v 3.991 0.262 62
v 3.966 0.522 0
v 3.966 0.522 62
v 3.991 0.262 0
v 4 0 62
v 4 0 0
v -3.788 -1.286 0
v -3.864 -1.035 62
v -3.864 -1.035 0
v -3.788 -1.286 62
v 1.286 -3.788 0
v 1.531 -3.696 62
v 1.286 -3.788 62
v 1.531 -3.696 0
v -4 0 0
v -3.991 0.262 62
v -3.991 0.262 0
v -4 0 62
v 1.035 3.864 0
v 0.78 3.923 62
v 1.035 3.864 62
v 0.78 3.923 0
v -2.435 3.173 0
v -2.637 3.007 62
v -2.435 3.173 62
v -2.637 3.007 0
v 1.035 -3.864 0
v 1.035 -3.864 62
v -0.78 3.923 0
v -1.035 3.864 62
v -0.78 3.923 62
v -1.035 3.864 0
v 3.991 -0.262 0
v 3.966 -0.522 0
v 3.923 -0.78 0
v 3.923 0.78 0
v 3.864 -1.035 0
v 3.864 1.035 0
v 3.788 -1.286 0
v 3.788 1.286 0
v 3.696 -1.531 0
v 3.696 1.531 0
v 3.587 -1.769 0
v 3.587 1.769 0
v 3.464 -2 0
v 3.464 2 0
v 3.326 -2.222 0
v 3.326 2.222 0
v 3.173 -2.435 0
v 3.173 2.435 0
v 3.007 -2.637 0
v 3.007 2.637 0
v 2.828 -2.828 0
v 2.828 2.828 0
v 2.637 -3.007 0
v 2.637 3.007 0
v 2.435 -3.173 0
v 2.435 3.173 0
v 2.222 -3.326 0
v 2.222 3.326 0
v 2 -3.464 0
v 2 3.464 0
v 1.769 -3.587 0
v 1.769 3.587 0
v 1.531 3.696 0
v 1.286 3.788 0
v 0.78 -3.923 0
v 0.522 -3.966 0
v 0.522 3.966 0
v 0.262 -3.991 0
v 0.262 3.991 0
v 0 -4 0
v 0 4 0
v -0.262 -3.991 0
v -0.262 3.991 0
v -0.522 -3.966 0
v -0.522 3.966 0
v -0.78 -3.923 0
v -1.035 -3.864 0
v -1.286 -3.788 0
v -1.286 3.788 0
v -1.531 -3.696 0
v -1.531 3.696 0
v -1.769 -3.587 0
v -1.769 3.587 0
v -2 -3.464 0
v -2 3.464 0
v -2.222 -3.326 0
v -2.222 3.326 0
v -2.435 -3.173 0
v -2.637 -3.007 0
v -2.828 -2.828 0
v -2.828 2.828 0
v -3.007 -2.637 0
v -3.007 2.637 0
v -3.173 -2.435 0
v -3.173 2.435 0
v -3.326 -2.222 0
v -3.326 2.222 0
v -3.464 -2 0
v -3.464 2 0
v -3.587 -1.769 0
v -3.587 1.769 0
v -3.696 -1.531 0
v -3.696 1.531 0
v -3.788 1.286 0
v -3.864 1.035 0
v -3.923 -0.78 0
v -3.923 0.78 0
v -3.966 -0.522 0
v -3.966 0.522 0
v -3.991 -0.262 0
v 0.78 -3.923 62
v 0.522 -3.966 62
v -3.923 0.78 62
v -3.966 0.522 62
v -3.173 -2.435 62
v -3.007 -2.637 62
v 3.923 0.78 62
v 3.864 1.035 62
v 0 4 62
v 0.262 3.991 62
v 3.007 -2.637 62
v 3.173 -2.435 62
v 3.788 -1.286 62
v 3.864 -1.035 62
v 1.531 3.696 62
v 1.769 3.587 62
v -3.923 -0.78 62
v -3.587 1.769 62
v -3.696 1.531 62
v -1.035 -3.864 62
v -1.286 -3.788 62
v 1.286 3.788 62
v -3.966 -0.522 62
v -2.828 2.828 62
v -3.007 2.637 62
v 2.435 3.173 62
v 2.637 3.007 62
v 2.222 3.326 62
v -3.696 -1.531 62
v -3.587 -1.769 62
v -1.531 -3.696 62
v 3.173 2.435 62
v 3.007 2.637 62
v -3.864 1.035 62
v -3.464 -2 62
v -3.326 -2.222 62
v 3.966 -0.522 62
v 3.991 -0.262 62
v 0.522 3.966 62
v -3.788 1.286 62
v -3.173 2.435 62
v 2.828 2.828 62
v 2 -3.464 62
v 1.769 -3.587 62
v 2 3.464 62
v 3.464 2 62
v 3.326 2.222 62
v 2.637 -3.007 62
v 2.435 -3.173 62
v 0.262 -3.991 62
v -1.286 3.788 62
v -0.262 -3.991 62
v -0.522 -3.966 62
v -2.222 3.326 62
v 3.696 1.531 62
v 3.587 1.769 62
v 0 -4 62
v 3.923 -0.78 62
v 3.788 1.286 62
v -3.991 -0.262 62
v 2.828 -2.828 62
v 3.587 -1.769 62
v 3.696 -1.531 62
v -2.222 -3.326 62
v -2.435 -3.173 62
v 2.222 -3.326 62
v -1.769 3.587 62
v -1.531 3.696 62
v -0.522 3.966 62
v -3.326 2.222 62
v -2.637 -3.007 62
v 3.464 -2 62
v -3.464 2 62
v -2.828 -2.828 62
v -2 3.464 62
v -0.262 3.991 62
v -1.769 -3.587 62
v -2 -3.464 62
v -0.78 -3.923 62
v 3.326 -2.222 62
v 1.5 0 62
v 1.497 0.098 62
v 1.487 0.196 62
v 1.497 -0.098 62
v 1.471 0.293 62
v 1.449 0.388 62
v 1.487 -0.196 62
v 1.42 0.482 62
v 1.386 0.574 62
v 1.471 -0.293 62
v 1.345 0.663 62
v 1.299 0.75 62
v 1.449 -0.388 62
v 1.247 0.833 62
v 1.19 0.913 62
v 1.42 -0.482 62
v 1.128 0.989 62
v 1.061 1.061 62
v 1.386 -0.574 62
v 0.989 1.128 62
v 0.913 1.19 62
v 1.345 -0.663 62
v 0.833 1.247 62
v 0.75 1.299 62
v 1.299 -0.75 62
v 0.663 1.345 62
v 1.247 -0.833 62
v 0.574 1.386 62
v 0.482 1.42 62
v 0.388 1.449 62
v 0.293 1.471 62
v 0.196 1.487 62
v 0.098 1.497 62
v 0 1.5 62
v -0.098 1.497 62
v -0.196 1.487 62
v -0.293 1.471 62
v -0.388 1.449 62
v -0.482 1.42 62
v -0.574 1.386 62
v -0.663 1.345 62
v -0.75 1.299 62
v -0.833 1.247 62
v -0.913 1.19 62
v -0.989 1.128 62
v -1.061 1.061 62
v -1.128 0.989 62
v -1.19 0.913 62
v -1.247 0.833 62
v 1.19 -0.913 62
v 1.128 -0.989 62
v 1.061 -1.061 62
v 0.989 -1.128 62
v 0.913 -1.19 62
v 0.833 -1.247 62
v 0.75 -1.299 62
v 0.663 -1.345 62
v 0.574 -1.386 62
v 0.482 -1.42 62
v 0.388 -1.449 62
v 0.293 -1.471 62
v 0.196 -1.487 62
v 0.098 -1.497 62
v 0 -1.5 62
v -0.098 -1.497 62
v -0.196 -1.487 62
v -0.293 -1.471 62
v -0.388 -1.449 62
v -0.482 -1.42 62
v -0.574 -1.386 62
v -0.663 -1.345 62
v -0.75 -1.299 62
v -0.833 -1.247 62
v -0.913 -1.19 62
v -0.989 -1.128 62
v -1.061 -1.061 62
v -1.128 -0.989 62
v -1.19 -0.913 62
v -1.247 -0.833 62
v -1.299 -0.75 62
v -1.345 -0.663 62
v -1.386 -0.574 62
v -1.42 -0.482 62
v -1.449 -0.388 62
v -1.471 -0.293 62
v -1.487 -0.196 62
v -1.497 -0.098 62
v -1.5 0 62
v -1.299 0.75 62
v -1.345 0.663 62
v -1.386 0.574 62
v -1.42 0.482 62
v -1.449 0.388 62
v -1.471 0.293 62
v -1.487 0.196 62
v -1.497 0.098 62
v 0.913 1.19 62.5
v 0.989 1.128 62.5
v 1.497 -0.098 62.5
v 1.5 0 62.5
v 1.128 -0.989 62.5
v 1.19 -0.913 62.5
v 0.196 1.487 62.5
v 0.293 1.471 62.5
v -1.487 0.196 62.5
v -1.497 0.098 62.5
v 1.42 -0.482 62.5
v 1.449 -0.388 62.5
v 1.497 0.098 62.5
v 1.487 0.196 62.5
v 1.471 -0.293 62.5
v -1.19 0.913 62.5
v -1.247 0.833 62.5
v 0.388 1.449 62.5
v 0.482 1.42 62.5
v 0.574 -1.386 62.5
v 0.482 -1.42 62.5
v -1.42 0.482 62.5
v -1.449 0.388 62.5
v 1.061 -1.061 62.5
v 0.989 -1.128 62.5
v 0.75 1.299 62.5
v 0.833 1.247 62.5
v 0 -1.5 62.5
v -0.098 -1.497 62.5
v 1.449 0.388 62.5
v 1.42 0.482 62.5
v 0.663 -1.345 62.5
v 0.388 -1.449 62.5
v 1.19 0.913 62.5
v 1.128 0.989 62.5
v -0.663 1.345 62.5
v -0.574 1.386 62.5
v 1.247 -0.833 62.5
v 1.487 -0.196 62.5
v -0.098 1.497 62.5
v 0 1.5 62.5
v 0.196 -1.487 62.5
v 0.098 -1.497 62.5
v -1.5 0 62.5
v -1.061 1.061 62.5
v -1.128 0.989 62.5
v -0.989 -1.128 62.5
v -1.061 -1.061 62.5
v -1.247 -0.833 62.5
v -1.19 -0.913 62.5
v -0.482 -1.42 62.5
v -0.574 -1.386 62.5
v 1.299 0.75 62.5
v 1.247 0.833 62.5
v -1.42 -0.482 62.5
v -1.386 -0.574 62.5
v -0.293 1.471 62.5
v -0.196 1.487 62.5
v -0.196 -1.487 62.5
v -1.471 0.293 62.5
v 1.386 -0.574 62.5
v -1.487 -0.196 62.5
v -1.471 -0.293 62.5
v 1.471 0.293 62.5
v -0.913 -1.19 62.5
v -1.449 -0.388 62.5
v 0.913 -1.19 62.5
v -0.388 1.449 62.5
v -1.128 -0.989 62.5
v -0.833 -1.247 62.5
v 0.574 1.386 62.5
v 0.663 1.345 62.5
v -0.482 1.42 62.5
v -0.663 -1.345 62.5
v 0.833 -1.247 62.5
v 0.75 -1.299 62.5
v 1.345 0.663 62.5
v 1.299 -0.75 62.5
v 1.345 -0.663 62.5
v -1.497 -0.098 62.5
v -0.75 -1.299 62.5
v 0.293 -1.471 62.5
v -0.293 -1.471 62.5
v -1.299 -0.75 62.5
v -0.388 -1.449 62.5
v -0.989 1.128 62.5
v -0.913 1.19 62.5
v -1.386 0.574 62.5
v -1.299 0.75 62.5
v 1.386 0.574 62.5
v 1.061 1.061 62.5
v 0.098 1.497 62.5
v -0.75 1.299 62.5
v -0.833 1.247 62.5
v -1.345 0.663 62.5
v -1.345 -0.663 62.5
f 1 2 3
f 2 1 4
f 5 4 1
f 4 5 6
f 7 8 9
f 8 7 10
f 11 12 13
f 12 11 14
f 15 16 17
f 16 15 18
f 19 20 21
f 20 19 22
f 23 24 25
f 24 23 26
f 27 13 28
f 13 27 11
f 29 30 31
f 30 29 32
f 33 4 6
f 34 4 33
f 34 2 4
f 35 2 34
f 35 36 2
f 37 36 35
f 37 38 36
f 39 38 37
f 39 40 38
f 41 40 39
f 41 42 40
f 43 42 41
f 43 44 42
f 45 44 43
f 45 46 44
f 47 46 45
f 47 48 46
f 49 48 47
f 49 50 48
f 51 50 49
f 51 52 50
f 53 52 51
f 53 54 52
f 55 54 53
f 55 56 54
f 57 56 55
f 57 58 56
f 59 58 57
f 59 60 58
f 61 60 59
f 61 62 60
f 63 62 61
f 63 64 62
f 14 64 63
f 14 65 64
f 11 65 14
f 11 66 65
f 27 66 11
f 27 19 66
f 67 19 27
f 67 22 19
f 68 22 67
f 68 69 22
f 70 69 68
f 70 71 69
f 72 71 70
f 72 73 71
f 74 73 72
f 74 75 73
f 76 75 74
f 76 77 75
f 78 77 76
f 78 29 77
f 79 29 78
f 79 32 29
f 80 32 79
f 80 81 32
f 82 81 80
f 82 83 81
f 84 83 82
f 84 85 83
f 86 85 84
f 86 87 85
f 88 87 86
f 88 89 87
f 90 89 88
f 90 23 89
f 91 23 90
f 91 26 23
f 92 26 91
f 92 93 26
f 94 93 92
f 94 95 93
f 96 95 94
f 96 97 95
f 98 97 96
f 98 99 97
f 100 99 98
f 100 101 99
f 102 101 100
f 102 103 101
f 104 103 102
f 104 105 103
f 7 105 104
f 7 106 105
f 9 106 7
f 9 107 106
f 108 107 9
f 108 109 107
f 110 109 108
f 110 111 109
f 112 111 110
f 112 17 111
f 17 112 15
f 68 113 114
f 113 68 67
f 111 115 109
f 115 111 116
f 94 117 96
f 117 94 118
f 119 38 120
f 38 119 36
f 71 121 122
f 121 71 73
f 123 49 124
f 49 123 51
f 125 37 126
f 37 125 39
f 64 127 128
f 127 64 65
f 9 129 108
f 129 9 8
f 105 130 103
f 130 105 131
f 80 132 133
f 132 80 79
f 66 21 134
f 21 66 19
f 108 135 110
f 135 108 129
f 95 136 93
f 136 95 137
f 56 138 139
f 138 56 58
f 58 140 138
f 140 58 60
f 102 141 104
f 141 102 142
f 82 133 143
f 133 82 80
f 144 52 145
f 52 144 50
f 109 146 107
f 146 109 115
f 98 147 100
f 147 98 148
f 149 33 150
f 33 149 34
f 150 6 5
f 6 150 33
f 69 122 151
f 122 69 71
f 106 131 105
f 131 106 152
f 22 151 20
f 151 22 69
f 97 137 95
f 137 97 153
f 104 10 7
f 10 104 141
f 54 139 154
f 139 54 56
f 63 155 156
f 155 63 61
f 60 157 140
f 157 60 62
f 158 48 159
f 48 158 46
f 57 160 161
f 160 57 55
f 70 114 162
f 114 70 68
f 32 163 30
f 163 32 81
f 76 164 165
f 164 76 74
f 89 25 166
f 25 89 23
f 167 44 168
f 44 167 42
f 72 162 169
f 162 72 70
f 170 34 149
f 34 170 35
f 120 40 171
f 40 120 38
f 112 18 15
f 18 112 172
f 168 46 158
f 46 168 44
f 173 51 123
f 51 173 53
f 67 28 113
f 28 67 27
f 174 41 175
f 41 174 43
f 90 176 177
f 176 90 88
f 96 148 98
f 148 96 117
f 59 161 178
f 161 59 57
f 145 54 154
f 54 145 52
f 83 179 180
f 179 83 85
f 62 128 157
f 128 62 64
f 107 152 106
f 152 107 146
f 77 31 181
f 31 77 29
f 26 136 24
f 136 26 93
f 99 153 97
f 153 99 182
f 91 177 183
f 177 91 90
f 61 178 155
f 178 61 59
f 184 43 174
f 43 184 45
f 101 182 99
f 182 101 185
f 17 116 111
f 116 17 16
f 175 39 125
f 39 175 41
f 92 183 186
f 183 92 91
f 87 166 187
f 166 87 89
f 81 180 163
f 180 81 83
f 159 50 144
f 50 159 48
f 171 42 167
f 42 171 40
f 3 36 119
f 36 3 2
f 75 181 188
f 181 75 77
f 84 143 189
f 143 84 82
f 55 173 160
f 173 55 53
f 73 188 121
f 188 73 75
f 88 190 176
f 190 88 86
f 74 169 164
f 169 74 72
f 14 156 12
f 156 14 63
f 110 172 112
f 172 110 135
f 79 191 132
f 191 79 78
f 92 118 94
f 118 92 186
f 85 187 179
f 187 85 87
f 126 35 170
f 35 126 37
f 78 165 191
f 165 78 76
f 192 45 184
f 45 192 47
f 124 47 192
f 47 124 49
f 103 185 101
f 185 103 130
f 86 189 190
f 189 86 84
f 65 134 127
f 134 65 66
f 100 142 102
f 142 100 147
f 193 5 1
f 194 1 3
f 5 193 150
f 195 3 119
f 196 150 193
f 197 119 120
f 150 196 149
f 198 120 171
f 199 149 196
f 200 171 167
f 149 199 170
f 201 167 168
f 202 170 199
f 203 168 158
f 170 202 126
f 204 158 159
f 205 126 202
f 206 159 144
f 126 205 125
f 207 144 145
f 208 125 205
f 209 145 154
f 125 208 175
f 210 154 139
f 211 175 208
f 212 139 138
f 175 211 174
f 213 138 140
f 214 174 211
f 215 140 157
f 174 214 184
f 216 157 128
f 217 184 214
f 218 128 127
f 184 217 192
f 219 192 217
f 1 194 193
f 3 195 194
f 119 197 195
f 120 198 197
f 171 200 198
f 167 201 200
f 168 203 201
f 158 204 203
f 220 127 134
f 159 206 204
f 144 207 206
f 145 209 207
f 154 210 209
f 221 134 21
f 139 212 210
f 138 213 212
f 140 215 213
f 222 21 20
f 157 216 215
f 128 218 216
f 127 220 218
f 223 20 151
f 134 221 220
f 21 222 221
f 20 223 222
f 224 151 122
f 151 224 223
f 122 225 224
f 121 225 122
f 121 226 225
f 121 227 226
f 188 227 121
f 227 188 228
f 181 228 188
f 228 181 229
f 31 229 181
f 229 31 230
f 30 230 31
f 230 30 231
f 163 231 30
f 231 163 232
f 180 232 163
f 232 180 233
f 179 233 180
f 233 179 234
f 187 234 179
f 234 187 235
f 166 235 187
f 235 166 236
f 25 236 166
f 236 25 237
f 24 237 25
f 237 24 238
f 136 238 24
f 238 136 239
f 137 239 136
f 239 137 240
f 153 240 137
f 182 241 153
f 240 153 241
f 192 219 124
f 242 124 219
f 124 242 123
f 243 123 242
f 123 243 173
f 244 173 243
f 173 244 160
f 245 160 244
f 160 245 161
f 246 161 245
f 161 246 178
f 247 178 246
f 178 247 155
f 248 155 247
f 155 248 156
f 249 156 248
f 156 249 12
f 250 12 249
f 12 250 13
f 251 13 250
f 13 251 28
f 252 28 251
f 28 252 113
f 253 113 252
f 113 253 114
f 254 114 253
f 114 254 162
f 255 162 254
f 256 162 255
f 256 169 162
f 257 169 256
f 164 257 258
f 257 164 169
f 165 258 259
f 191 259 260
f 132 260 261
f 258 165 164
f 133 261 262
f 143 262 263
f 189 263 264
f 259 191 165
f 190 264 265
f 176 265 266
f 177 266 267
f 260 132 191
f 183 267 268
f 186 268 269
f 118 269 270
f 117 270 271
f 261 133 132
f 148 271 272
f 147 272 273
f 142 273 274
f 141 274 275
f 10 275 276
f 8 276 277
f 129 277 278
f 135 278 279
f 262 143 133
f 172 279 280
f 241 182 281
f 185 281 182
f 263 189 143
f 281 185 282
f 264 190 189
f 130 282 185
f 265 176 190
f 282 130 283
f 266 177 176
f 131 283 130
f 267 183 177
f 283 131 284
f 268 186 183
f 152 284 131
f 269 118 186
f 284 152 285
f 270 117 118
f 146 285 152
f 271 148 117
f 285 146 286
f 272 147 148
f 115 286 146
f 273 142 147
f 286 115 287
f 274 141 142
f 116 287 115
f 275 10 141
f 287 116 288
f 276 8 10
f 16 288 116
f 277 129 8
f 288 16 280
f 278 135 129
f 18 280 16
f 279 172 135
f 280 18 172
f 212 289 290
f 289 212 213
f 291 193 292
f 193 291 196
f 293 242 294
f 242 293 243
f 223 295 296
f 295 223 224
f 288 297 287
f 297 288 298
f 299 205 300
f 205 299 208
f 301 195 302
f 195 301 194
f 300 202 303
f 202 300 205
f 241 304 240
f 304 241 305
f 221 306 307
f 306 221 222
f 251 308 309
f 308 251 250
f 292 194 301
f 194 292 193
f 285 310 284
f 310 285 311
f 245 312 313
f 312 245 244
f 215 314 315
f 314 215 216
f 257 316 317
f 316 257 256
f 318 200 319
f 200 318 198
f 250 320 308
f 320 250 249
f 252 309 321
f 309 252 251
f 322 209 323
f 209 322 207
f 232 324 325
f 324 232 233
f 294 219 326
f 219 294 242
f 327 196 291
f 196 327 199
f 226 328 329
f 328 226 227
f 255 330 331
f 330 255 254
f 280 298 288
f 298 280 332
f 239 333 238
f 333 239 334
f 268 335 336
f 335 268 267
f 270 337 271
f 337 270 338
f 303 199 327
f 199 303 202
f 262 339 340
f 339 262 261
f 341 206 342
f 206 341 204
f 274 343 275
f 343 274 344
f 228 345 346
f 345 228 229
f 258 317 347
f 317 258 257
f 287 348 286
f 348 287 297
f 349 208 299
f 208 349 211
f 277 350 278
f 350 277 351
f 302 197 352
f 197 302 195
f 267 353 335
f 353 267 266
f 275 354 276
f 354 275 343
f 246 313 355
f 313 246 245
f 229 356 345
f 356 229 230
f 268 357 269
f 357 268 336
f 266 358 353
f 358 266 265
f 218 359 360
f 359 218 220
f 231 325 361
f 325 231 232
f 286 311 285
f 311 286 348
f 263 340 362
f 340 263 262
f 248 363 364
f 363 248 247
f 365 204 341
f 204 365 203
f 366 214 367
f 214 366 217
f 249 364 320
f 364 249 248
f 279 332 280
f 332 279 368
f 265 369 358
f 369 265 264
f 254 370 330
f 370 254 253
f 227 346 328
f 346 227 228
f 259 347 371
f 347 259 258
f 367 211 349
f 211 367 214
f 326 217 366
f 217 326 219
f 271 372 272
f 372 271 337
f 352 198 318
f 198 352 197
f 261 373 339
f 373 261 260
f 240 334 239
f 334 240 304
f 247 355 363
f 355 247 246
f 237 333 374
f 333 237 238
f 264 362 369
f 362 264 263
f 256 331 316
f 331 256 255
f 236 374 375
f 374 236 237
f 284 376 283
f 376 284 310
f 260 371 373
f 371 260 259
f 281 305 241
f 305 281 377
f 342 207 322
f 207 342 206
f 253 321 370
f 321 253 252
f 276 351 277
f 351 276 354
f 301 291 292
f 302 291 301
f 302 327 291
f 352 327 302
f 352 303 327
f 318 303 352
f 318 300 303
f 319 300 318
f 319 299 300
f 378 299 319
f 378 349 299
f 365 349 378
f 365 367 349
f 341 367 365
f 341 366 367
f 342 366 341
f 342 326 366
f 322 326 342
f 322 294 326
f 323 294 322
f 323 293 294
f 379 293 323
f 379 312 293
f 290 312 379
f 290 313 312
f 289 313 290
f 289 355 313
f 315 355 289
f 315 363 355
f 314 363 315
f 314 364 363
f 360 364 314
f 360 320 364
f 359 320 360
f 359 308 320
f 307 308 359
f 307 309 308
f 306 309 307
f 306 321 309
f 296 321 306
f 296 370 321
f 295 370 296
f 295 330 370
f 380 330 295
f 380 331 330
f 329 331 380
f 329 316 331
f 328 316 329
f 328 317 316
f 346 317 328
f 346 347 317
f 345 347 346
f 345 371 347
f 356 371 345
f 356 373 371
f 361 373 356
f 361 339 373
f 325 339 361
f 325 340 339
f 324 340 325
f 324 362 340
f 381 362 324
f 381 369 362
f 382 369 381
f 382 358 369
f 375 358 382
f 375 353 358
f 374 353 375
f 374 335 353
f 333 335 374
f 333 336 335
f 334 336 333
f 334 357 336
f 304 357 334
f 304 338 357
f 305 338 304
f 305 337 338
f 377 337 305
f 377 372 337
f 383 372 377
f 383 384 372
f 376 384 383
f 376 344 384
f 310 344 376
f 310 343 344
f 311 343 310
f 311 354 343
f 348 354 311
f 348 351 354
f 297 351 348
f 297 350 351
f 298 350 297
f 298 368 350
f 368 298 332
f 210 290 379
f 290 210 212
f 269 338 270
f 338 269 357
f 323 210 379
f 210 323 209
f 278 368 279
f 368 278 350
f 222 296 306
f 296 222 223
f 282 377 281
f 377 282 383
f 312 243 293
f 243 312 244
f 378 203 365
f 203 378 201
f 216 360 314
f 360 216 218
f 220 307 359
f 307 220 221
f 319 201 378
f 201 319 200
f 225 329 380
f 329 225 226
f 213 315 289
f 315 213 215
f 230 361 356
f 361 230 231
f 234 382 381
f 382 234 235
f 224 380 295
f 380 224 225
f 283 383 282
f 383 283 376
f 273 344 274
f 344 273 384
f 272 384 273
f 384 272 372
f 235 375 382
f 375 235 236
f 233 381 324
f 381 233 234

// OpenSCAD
// Pestle for 1.5 mL microcentrifuge tube
// Print orientation: standing upright on the XY plane (z = 0)

// ---------------- Parameters ----------------
handle_d      = 8;     // handle diameter (mm)
handle_h      = 45;    // handle height (mm)

cone_top_d    = 8;     // cone diameter at top of handle (mm)
cone_bottom_d = 3;     // cone diameter at tip start (mm)
cone_h        = 17;    // cone height (mm) (z = 45 to z = 62)

tip_d         = 3;     // sphere tip diameter (mm)
tip_z         = 62;    // sphere centre height (mm)

groove_w      = 2;     // groove width in Z (mm)
groove_depth  = 1;     // groove depth from surface (mm)
groove_z      = [10, 15, 20, 25]; // groove centre heights (mm)

eps           = 0.5;   // cutter overshoot past faces (mm)
$fn           = 96;    // curve resolution

// ---------------- Model ----------------
union() {
    // Handle
    cylinder(d = handle_d, h = handle_h);

    // Cone (tapers from 8 mm to 3 mm over 17 mm)
    translate([0, 0, handle_h])
        linear_extrude(height = cone_h)
            circle(d = cone_top_d);
    translate([0, 0, handle_h + cone_h])
        linear_extrude(height = eps)
            circle(d = cone_bottom_d);

    // Rounded tip (sphere centred at z = 62)
    translate([0, 0, tip_z - tip_d / 2])
        sphere(d = tip_d);

    // Grip grooves
    for (z = groove_z)
        translate([0, 0, z - groove_w / 2])
            rotate([0, 90, 0])
                cylinder(d = groove_w, h = groove_depth, center = true);
}
